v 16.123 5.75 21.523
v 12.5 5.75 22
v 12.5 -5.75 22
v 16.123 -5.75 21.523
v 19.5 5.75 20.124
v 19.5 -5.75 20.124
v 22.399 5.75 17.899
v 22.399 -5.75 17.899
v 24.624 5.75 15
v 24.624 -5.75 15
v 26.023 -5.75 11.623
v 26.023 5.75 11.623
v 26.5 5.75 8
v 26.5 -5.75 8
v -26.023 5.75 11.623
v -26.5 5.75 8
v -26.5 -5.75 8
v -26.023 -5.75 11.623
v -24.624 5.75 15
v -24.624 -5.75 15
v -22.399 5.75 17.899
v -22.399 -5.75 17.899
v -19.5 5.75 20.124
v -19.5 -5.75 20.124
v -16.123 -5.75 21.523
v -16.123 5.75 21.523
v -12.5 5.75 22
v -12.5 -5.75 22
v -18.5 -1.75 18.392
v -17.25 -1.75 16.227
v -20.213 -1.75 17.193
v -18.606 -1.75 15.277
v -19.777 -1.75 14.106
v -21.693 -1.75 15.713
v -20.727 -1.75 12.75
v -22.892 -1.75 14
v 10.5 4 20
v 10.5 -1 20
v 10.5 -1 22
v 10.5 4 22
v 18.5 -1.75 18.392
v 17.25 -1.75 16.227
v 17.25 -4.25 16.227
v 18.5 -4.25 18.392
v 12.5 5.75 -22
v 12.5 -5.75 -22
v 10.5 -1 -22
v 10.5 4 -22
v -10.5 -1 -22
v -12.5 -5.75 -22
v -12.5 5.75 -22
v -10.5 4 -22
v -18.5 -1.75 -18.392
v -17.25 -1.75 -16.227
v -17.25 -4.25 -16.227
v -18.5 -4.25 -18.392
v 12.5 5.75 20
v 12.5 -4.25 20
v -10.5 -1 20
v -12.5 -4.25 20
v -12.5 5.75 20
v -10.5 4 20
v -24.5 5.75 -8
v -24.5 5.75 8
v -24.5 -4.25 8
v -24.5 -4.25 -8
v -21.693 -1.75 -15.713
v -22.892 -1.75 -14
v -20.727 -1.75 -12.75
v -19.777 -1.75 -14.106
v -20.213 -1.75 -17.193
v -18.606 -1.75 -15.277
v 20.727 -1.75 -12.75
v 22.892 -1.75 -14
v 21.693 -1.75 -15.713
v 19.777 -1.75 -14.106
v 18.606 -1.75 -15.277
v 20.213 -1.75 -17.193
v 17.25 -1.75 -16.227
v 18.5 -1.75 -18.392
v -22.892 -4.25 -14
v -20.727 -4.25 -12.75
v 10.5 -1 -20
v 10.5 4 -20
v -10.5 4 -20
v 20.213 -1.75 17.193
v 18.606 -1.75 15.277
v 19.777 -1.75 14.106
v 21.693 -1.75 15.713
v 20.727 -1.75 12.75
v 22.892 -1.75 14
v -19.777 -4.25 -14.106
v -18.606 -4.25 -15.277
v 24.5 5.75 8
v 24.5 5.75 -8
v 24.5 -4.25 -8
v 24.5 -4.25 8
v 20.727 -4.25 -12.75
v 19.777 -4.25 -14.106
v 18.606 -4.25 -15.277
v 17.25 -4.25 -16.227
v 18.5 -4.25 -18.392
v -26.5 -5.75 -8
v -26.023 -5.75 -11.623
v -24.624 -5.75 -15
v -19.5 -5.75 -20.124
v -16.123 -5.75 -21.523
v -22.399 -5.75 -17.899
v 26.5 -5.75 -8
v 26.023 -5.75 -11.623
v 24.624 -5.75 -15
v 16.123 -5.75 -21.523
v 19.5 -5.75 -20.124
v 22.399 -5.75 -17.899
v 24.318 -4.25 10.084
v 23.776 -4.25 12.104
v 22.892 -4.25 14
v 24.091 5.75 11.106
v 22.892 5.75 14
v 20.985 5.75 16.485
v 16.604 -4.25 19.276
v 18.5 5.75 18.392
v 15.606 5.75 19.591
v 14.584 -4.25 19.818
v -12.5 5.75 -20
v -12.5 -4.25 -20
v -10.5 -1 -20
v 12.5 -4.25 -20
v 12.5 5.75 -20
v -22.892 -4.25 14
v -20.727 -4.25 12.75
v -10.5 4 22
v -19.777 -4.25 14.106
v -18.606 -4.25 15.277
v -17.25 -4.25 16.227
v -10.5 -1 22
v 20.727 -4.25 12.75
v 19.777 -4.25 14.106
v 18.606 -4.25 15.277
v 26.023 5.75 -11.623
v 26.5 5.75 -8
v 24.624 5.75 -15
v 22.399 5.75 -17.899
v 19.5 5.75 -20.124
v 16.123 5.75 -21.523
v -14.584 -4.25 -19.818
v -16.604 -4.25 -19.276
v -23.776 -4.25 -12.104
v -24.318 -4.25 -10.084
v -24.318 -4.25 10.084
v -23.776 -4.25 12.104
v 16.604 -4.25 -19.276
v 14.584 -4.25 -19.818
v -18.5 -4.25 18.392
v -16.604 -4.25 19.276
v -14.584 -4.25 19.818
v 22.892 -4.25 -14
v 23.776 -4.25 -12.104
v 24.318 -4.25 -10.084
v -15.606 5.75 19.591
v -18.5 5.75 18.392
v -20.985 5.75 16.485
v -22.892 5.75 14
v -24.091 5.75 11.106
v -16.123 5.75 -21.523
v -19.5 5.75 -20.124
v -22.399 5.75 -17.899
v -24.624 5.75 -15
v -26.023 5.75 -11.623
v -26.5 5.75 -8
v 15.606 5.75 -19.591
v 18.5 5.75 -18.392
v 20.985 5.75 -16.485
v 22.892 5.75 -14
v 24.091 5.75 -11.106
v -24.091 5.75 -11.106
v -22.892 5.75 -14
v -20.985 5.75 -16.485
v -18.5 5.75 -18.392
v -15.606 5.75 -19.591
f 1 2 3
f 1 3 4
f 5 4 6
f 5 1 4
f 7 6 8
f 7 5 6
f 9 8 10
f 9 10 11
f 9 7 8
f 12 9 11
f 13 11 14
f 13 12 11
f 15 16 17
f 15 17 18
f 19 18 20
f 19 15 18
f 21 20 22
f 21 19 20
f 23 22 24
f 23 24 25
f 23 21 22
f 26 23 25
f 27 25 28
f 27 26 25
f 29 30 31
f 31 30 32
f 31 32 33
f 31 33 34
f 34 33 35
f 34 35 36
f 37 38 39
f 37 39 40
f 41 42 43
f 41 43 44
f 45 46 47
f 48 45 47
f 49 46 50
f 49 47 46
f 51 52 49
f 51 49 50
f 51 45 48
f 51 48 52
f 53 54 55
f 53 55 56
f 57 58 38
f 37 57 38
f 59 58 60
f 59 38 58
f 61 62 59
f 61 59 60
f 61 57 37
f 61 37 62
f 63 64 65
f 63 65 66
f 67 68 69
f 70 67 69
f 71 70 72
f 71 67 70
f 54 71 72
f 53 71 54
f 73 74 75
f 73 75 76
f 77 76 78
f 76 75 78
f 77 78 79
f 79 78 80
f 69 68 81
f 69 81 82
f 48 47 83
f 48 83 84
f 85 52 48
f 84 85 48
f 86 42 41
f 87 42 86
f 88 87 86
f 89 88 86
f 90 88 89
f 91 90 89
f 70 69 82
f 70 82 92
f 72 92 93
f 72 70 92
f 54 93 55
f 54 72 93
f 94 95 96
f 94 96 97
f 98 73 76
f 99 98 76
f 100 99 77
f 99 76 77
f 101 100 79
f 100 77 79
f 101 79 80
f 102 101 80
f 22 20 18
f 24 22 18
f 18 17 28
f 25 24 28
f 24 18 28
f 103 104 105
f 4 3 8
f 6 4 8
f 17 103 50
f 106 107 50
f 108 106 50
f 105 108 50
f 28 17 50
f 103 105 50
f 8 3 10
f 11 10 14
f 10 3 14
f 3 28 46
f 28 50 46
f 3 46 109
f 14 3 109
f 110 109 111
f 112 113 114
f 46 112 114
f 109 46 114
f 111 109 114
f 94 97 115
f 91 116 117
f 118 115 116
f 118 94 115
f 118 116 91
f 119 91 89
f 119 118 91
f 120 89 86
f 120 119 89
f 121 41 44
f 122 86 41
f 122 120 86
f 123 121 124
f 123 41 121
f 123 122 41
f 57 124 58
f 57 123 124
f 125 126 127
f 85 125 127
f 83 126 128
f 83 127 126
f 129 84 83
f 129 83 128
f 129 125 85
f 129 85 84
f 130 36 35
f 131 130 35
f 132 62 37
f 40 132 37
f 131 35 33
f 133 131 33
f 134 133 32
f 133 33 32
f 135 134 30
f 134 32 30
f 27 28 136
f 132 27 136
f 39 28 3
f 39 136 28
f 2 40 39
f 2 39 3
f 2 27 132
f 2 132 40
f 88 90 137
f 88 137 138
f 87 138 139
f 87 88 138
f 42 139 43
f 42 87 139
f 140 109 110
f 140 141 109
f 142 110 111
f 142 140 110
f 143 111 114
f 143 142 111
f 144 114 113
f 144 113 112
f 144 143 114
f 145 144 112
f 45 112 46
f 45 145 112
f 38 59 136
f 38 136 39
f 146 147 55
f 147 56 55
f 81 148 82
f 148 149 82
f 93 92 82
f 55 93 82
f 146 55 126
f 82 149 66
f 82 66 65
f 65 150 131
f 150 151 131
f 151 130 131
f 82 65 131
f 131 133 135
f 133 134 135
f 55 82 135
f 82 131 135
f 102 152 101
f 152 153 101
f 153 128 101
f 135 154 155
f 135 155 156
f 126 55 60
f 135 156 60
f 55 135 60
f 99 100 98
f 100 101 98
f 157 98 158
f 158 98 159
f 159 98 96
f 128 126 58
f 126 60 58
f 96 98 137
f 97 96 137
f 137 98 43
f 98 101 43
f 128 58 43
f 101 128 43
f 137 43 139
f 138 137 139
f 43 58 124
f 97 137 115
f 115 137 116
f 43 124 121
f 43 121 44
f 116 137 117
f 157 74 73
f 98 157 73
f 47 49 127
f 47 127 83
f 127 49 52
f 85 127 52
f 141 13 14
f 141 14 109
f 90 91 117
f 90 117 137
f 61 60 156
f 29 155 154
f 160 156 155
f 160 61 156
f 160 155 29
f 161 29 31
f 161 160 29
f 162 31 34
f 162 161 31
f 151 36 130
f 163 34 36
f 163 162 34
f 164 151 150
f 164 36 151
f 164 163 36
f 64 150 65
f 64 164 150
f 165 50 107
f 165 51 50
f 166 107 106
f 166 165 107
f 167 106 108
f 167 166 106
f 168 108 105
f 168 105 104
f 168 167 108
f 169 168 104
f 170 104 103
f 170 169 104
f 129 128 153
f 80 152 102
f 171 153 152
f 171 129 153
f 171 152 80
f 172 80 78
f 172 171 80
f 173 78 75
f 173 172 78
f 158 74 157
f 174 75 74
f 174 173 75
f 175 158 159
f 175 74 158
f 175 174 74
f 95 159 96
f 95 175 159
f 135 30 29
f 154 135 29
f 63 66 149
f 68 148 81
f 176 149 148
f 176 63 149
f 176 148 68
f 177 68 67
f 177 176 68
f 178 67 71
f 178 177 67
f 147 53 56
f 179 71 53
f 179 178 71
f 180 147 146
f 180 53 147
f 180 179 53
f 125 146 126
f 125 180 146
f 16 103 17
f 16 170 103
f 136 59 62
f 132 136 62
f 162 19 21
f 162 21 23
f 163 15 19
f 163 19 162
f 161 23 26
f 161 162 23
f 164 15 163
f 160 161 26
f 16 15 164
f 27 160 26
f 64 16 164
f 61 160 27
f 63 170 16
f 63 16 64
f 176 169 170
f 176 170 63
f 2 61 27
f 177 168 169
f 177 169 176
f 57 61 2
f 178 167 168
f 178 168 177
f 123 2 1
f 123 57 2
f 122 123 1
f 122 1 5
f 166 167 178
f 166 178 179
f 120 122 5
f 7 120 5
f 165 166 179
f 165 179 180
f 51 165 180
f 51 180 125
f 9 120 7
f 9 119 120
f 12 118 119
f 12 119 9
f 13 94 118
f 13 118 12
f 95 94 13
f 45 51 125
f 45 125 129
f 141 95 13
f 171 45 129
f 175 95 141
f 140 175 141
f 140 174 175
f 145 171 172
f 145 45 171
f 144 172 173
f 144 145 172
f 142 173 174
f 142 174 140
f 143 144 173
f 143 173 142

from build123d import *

# Parameters (mm, degrees)
BOSS_EXTRUDE1_DEPTH     = 5.75
CUT_EXTRUDE1_DEPTH      = 50.993124527
CUT_EXTRUDE1_DEPTH_BACK = 50.993124527
SKETCH2_W               = 21
SKETCH2_H               = 5
BOSS_EXTRUDE2_START     = -1.5
BOSS_EXTRUDE2_DEPTH     = 1.5
BOSS_EXTRUDE3_START     = 2.5
BOSS_EXTRUDE3_DEPTH     = 2.5


with BuildPart() as part:
    # Sketch1 → Boss-Extrude1 (new, symmetric)
    with BuildSketch(Plane(origin=(0, 0, 0), x_dir=(1, 0, 0), z_dir=(0, 1, 0))):
        with BuildLine():
            Line((-26.5, 8), (-26.5, -8))
            ThreePointArc((-26.5, -8), (-22.399494937, -17.899494937), (-12.5, -22))
            Line((-12.5, -22), (12.5, -22))
            ThreePointArc((12.5, -22), (22.399494937, -17.899494937), (26.5, -8))
            Line((26.5, -8), (26.5, 8))
            ThreePointArc((26.5, 8), (22.399494937, 17.899494937), (12.5, 22))
            Line((12.5, 22), (-12.5, 22))
            ThreePointArc((-12.5, 22), (-22.399494937, 17.899494937), (-26.5, 8))
        make_face()
        with BuildLine():
            Line((12.5, -20), (-12.5, -20))
            ThreePointArc((-12.5, -20), (-20.985281374, -16.485281374), (-24.5, -8))
            Line((-24.5, -8), (-24.5, 8))
            ThreePointArc((-24.5, 8), (-20.985281374, 16.485281374), (-12.5, 20))
            Line((-12.5, 20), (12.5, 20))
            ThreePointArc((12.5, 20), (20.985281374, 16.485281374), (24.5, 8))
            Line((24.5, 8), (24.5, -8))
            ThreePointArc((24.5, -8), (20.985281374, -16.485281374), (12.5, -20))
        make_face(mode=Mode.SUBTRACT)
    extrude(amount=BOSS_EXTRUDE1_DEPTH, both=True)

    # Sketch2 → Cut-Extrude1 (cut, two sides: drawn at the far end of the back side and taken through both)
    with BuildSketch(Plane.XY.offset(-20).offset(-CUT_EXTRUDE1_DEPTH_BACK)):
        with Locations((0, 1.5)):
            Rectangle(SKETCH2_W, SKETCH2_H)
    extrude(amount=CUT_EXTRUDE1_DEPTH + CUT_EXTRUDE1_DEPTH_BACK, mode=Mode.SUBTRACT)

    # Sketch3 → Boss-Extrude2 (add)
    with BuildSketch(Plane.XZ.offset(5.75).offset(BOSS_EXTRUDE2_START)):
        with BuildLine():
            Line((-12.5, -22), (12.5, -22))
            ThreePointArc((12.5, -22), (22.399494937, -17.899494937), (26.5, -8))
            Line((26.5, -8), (26.5, 8))
            ThreePointArc((26.5, 8), (22.399494937, 17.899494937), (12.5, 22))
            Line((12.5, 22), (-12.5, 22))
            ThreePointArc((-12.5, 22), (-22.399494937, 17.899494937), (-26.5, 8))
            Line((-26.5, 8), (-26.5, -8))
            ThreePointArc((-26.5, -8), (-22.399494937, -17.899494937), (-12.5, -22))
        make_face()
    extrude(amount=BOSS_EXTRUDE2_DEPTH)

    # Sketch6 → Boss-Extrude3 (add)
    with BuildSketch(Plane(origin=(0, -4.25, 0), x_dir=(1, 0, 0), z_dir=(0, 1, 0)).offset(BOSS_EXTRUDE3_START)):
        with BuildLine():
            Line((-22.892304845, 14), (-20.727241336, 12.75))
            ThreePointArc((-20.727241336, 12.75), (-19.217514421, 14.717514421), (-17.25, 16.227241336))
            Line((-17.25, 16.227241336), (-18.5, 18.392304845))
            ThreePointArc((-18.5, 18.392304845), (-20.985281374, 16.485281374), (-22.892304845, 14))
        make_face()
        with BuildLine():
            Line((17.25, 16.227241336), (18.5, 18.392304845))
            ThreePointArc((18.5, 18.392304845), (20.985281374, 16.485281374), (22.892304845, 14))
            Line((22.892304845, 14), (20.727241336, 12.75))
            ThreePointArc((20.727241336, 12.75), (19.217514421, 14.717514421), (17.25, 16.227241336))
        make_face()
        with BuildLine():
            Line((22.892304845, -14), (20.727241336, -12.75))
            ThreePointArc((20.727241336, -12.75), (19.217514421, -14.717514421), (17.25, -16.227241336))
            Line((17.25, -16.227241336), (18.5, -18.392304845))
            ThreePointArc((18.5, -18.392304845), (20.985281374, -16.485281374), (22.892304845, -14))
        make_face()
        with BuildLine():
            Line((-17.25, -16.227241336), (-18.5, -18.392304845))
            ThreePointArc((-18.5, -18.392304845), (-20.985281374, -16.485281374), (-22.892304845, -14))
            Line((-22.892304845, -14), (-20.727241336, -12.75))
            ThreePointArc((-20.727241336, -12.75), (-19.217514421, -14.717514421), (-17.25, -16.227241336))
        make_face()
    extrude(amount=-BOSS_EXTRUDE3_DEPTH)


solid = part.part
